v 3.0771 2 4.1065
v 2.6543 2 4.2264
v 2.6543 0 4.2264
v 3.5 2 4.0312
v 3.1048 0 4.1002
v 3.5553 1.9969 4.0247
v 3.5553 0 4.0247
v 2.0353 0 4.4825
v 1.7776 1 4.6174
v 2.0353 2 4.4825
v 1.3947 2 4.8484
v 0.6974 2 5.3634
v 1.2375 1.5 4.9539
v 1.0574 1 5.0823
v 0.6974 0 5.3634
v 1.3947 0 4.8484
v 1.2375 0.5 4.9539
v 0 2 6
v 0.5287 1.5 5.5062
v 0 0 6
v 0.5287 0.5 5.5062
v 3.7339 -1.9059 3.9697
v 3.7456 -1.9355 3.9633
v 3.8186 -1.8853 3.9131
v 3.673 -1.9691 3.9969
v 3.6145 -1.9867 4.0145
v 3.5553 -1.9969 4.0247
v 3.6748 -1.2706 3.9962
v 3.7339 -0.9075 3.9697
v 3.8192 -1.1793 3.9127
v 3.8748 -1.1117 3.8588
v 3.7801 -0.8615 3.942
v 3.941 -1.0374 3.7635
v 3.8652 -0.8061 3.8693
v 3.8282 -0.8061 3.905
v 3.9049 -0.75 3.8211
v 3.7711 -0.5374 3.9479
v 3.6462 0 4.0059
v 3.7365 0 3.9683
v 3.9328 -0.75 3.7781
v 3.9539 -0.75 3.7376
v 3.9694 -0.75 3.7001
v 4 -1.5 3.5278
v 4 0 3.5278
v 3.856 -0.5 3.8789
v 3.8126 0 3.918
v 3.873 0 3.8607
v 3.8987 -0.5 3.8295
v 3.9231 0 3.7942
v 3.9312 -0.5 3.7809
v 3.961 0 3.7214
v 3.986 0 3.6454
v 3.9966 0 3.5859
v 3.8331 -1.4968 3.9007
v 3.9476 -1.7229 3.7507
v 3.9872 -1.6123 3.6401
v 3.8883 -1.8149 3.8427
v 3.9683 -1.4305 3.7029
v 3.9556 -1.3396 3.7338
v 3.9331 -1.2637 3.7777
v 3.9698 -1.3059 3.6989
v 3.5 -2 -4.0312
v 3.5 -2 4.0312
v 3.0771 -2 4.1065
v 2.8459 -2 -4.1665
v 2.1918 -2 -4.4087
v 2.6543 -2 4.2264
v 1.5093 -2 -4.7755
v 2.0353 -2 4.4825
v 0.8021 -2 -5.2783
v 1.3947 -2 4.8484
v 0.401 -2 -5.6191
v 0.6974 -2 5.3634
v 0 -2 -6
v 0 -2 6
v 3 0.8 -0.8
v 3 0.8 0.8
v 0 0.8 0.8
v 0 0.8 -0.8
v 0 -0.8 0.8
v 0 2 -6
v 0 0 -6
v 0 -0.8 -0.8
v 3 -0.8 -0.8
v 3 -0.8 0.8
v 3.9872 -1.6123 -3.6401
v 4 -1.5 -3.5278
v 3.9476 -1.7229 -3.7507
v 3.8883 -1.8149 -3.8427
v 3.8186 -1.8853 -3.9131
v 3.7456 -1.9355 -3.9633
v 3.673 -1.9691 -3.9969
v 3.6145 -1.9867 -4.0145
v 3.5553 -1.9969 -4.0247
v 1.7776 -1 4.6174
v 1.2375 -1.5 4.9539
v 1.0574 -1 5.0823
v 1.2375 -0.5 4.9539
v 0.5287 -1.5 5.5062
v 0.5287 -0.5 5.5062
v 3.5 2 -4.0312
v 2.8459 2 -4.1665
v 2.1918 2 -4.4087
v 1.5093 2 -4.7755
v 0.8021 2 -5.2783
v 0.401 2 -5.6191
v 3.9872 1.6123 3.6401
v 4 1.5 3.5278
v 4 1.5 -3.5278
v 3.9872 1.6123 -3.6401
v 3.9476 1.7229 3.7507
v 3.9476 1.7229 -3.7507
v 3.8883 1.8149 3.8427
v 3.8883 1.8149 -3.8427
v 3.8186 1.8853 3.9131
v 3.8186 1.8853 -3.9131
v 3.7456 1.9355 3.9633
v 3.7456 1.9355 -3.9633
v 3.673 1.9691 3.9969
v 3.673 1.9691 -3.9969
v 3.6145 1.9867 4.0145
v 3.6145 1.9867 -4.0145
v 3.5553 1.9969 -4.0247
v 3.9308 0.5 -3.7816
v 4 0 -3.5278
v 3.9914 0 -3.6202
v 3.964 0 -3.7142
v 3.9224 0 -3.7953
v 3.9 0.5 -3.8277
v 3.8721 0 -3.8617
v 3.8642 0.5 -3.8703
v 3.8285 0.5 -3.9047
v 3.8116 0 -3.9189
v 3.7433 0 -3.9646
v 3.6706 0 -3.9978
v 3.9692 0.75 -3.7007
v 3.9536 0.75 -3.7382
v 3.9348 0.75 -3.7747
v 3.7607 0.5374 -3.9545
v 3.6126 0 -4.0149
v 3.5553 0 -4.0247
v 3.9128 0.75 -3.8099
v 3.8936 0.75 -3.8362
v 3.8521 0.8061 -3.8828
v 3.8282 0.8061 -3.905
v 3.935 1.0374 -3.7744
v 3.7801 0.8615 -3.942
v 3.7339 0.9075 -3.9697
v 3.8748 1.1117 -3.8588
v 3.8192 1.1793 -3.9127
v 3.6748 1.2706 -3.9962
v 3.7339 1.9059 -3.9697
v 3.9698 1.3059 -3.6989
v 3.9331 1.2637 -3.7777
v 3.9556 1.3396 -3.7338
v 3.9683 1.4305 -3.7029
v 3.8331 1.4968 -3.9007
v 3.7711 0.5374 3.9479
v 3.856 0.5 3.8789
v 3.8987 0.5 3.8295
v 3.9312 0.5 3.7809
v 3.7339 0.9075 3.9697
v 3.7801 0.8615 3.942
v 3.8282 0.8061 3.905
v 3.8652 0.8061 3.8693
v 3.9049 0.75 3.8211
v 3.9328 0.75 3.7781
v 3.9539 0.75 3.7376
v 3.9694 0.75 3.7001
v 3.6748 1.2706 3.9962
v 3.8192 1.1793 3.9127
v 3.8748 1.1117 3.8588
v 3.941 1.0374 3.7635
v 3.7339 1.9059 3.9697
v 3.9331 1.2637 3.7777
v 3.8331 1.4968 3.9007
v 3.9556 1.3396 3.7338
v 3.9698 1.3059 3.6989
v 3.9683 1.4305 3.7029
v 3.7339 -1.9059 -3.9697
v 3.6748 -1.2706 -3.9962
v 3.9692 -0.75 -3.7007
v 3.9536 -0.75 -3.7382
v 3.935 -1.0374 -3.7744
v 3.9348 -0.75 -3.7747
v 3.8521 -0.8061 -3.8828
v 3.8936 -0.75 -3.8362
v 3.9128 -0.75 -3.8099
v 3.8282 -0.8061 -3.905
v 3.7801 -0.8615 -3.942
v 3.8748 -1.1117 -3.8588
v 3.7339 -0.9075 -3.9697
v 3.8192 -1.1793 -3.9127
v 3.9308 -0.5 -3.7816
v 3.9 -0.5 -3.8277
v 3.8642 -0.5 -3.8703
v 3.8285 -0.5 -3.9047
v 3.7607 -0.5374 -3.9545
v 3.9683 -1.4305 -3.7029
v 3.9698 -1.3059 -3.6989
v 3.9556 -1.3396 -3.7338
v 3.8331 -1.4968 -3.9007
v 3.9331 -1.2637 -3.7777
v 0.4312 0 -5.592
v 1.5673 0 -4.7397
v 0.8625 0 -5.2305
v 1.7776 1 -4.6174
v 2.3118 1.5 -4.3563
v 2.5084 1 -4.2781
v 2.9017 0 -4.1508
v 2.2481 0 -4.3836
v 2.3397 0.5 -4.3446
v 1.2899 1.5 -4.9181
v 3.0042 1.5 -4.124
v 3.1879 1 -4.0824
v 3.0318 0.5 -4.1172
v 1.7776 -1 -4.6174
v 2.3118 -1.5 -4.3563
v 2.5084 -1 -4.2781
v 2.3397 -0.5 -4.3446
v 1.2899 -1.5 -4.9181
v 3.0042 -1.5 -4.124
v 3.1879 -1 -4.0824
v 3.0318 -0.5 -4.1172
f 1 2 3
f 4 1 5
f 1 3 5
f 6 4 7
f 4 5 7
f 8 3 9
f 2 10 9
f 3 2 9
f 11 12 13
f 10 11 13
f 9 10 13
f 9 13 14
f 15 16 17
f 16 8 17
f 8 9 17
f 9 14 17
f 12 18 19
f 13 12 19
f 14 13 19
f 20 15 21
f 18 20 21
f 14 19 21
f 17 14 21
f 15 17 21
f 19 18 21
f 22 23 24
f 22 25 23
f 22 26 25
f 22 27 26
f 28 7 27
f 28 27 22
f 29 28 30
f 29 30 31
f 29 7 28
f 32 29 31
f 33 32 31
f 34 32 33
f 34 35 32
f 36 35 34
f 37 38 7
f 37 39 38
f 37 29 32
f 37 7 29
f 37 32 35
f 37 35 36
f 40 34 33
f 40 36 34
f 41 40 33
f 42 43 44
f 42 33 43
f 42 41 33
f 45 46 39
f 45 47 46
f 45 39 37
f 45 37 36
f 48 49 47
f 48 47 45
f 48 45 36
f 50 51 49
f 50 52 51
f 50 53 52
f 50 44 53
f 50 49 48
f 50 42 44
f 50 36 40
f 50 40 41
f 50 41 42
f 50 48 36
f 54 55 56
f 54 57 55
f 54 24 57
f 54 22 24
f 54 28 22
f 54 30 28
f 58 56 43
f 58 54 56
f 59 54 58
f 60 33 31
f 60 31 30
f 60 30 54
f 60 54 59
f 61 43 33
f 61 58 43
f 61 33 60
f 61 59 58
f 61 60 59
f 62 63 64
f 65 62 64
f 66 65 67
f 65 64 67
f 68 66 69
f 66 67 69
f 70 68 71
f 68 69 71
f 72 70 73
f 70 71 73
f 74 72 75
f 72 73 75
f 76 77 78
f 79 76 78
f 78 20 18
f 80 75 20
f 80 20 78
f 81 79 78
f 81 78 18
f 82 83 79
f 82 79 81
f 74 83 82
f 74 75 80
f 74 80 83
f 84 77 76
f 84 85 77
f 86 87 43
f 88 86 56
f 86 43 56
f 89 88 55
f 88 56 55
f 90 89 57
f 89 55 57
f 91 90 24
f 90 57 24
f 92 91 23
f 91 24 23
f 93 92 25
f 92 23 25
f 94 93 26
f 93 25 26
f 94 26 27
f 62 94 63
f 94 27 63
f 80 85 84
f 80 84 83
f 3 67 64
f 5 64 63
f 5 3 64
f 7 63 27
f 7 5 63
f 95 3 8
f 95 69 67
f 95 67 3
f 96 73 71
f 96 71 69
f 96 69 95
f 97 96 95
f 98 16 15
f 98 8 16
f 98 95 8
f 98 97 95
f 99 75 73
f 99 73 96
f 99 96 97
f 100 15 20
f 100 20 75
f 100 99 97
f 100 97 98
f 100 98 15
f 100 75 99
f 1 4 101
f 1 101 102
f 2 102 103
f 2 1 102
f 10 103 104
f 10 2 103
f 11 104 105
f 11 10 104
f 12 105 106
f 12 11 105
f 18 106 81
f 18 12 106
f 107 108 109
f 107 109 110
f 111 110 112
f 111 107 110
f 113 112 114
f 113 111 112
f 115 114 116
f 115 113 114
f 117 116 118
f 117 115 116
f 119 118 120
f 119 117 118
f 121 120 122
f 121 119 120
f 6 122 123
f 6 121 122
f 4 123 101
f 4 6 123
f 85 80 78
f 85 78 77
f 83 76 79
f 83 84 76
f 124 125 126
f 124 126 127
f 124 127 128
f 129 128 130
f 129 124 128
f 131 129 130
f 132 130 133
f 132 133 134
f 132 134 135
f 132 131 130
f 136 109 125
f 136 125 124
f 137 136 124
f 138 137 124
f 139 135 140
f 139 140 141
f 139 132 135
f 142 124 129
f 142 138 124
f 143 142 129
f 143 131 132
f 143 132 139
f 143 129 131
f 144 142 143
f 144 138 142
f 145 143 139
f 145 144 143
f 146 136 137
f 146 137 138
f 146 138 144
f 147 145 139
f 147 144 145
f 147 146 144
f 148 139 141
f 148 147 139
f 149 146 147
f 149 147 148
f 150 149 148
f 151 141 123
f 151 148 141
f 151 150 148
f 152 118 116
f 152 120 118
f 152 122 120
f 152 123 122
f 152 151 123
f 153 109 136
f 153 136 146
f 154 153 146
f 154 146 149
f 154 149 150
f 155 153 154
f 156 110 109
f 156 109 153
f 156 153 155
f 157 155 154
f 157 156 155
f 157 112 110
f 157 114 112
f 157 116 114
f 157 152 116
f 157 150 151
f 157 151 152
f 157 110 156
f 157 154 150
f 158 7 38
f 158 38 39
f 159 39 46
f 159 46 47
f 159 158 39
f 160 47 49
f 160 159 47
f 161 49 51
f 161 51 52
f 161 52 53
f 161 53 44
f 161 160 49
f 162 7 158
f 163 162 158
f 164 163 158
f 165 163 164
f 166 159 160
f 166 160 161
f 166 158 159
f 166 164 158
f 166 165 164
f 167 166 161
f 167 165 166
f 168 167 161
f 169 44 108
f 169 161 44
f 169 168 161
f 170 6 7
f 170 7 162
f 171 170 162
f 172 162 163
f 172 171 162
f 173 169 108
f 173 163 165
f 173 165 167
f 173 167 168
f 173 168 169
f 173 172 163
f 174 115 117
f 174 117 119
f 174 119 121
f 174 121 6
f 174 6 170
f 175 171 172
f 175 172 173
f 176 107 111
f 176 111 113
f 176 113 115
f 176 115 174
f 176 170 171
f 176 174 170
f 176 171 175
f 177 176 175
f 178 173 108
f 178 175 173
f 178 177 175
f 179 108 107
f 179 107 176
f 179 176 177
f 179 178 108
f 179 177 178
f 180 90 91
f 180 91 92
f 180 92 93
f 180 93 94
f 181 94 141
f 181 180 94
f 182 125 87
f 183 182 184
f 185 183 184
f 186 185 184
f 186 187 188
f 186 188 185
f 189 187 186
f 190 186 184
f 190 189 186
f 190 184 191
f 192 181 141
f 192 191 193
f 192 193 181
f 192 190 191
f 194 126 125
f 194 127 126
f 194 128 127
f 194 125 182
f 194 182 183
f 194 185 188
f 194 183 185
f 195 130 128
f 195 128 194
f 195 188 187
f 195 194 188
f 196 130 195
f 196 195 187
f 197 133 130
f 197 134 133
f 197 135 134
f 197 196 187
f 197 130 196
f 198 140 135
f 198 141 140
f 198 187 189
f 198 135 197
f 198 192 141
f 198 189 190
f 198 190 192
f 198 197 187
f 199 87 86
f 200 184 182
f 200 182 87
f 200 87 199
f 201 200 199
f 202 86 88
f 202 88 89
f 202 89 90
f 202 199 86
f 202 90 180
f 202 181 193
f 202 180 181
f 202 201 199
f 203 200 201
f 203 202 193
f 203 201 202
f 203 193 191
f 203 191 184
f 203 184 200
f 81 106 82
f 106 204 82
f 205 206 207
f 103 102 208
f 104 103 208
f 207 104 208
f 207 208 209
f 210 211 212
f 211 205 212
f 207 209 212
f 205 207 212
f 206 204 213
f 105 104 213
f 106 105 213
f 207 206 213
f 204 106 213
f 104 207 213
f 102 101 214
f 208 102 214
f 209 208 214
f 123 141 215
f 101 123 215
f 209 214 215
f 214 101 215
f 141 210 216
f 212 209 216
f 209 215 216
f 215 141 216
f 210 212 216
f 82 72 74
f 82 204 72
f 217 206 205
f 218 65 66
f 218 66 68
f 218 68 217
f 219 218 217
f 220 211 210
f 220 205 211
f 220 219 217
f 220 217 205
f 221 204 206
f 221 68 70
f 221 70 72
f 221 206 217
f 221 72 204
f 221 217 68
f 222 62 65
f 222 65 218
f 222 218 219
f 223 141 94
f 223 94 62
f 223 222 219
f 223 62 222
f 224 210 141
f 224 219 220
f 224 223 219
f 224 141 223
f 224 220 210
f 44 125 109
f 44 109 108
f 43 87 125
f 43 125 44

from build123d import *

# Parameters (mm, degrees)
EXTRUDE048_DEPTH = 0.8
EXTRUDE047_DEPTH = 2
FILLET_R         = 0.5


with BuildPart() as extrude_switch_hole:
    # Sketch047 → Extrude048 (new body, symmetric)
    with BuildSketch(Plane.XZ):
        Polygon((0, 0.8), (3, 0.8), (3, -0.8), (0, -0.8), (0, 0), align=None)
    extrude(amount=EXTRUDE048_DEPTH, both=True)


with BuildPart() as cut_toggle_switch_cover:
    # Sketch046 → Extrude047 (new body, symmetric)
    with BuildSketch(Plane.XZ):
        with BuildLine():
            add(Edge.make_bspline(
                [(0, 6), (2, 4), (4, 4)],
                knots=[0, 0, 0, 1, 1, 1], degree=2))
            Line((0, 6), (0, 0))
            Line((0, 0), (0, -6))
            add(Edge.make_bspline(
                [(4, -4), (2, -4), (0, -6)],
                knots=[0, 0, 0, 1, 1, 1], degree=2))
            Line((4, -4), (4, 0))
            Line((4, 0), (4, 4))
        make_face()
    extrude(amount=EXTRUDE047_DEPTH, both=True)

    # Fillet
    fillet_edges = [cut_toggle_switch_cover.edges().sort_by_distance(p)[0] for p in [
        (4, 0, 4),
        (4, 0, -4),
        (4, 2, -2),
        (4, -2, -2),
        (4, 2, 2),
        (4, -2, 2),
    ]]
    fillet(fillet_edges, radius=FILLET_R)

    # Cut012: cut Extrude_Switch_hole
    add(extrude_switch_hole.part, mode=Mode.SUBTRACT)


solid = cut_toggle_switch_cover.part
